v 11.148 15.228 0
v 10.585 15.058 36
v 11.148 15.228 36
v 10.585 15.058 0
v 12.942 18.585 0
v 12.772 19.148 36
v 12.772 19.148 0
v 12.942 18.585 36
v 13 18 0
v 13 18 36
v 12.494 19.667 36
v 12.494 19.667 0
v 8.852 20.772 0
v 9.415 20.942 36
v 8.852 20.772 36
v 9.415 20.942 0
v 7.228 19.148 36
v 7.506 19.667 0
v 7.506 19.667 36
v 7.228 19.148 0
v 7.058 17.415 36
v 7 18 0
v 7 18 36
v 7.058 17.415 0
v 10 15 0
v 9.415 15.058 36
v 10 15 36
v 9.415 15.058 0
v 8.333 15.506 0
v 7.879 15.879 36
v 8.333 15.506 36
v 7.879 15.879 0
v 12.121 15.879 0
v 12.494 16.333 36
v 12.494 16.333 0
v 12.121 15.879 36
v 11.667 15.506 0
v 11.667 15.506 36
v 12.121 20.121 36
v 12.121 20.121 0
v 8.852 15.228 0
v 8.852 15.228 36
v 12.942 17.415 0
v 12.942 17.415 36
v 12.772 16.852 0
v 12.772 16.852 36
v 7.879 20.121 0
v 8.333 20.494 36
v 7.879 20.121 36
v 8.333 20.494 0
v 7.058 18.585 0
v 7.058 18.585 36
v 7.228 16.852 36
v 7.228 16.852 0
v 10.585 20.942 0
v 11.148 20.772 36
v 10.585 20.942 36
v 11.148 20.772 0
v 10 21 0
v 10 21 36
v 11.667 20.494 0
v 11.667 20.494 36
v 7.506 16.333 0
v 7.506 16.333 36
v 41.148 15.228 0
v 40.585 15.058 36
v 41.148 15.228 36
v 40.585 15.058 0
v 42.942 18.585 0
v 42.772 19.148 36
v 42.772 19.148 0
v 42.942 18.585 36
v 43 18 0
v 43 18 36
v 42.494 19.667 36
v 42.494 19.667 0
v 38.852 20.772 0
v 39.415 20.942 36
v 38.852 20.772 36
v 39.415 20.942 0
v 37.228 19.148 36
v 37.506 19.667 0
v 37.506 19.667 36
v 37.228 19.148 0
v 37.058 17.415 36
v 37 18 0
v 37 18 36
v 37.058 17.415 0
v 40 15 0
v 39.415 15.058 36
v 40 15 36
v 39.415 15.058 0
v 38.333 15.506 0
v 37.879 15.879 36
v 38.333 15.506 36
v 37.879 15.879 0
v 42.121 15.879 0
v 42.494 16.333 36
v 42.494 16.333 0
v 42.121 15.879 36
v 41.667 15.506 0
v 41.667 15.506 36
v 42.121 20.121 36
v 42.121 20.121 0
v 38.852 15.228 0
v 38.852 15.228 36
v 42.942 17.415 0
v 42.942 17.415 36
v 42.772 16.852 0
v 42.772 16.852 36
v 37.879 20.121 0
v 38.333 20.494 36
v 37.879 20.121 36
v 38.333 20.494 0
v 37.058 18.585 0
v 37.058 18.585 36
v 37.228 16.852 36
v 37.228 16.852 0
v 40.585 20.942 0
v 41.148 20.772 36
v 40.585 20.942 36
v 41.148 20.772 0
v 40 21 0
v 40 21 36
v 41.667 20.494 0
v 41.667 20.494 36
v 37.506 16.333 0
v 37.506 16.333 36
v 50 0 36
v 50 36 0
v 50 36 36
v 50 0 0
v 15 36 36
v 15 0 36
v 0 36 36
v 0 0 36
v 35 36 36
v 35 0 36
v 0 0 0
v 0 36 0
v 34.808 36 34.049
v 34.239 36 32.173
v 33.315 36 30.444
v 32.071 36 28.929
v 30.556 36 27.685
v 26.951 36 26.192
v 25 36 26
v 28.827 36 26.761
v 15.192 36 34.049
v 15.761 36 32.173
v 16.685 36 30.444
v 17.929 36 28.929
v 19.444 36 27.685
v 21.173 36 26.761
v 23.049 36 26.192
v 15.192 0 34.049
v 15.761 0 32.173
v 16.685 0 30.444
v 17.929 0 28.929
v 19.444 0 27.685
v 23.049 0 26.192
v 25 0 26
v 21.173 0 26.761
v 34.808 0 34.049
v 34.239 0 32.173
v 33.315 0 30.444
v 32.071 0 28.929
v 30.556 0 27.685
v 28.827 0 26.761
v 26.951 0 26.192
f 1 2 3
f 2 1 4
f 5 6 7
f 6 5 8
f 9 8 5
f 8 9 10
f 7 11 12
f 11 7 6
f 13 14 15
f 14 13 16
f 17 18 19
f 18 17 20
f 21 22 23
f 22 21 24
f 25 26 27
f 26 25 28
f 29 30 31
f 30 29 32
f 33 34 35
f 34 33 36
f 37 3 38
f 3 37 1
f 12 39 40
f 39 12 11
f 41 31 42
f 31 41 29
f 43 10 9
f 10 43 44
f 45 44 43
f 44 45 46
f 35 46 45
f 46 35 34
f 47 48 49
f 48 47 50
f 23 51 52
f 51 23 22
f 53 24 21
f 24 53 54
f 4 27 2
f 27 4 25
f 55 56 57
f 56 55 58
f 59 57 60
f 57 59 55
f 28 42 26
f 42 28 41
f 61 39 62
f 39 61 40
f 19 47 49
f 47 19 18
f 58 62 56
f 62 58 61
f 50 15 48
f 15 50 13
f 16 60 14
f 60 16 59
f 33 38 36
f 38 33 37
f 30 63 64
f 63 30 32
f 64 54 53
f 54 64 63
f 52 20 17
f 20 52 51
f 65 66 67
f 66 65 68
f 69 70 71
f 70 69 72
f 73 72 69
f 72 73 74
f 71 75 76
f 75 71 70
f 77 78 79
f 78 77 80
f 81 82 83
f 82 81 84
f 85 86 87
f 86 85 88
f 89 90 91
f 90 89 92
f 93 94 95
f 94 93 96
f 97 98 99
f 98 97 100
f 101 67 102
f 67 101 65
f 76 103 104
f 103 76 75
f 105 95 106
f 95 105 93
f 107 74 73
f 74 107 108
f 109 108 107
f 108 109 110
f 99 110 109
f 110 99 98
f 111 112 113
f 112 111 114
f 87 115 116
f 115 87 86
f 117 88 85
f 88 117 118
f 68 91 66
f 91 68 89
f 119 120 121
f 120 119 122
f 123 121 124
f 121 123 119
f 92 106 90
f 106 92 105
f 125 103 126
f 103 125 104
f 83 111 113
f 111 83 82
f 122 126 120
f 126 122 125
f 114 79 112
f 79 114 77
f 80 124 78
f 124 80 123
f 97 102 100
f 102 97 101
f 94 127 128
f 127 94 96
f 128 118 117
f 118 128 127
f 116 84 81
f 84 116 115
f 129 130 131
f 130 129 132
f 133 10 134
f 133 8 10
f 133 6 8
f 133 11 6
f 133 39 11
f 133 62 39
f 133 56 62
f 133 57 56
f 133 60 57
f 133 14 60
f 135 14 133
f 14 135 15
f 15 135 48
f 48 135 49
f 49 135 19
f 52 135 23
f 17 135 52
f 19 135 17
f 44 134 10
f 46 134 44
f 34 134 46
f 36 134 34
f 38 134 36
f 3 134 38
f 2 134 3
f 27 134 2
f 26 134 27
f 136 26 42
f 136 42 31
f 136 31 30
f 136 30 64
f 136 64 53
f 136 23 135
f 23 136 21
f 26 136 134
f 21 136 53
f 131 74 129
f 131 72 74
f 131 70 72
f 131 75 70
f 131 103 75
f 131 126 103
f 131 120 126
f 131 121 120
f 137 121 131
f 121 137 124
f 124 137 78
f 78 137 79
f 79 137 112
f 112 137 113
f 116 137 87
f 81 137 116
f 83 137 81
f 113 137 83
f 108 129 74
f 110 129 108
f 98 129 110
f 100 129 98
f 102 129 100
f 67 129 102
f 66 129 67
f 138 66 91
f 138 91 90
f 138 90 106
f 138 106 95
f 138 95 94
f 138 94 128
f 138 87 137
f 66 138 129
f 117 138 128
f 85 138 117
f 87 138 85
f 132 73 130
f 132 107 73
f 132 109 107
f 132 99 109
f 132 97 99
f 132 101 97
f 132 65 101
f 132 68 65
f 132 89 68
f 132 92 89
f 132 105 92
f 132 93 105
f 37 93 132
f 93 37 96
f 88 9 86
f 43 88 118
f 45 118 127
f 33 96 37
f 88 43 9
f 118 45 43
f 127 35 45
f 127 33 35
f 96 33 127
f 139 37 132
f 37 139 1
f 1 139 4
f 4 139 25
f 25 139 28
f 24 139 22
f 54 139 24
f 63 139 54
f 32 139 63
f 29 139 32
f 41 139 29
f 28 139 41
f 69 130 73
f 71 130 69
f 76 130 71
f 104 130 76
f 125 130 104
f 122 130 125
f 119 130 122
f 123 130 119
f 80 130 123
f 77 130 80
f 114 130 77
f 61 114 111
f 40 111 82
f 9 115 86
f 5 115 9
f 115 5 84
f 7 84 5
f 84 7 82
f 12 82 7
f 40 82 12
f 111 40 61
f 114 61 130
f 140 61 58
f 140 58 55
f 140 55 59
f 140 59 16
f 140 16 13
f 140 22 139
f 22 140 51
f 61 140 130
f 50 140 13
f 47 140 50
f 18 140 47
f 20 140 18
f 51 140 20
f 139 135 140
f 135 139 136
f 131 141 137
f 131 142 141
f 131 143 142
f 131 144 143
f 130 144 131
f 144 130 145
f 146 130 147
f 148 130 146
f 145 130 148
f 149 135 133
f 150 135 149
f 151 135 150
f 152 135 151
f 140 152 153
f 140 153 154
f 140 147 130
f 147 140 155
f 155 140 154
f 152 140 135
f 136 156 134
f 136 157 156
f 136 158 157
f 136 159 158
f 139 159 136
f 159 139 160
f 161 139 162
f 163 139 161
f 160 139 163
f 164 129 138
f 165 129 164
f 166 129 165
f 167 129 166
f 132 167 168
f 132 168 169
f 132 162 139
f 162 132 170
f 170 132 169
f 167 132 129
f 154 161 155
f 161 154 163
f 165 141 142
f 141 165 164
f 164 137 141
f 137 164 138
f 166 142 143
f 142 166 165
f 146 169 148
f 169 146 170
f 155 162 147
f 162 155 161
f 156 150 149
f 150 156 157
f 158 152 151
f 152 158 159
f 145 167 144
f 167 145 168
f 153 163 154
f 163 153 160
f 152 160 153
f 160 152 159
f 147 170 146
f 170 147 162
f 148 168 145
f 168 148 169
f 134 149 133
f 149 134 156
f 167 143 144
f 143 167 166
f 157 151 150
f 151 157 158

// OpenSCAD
$fn = 32;

// ----------------------------------------------------------------------
// Saddle clamp: plain shaft clamp
// ----------------------------------------------------------------------

// --- parameters (mm) ---
blk_l = 50;               // block length, X
blk_w = 36;               // block width, Y
blk_h = 36;               // block height
clamp_r = 10;             // shaft groove radius
hole_r = 3;               // bolt hole radius
hole_m = 10;              // bolt hole margin from the ends
fit_tol = 0.05;           // tolerance for press fits, mm
free_tol = 0.2;           // tolerance for clearance fits, mm

saw_depth = clamp_r + 3;  // saw kerf depth

difference() {
  cube([blk_l, blk_w, blk_h]);
  translate([blk_l / 2, -1, blk_h])
    rotate([-90, 0, 0])
      cylinder(h = blk_w + 2, r = clamp_r);
  for (sx = [0, 1])
    translate([sx ? blk_l - hole_m : hole_m, blk_w / 2, -1])
      cylinder(r = hole_r, h = blk_h + 2);
}
